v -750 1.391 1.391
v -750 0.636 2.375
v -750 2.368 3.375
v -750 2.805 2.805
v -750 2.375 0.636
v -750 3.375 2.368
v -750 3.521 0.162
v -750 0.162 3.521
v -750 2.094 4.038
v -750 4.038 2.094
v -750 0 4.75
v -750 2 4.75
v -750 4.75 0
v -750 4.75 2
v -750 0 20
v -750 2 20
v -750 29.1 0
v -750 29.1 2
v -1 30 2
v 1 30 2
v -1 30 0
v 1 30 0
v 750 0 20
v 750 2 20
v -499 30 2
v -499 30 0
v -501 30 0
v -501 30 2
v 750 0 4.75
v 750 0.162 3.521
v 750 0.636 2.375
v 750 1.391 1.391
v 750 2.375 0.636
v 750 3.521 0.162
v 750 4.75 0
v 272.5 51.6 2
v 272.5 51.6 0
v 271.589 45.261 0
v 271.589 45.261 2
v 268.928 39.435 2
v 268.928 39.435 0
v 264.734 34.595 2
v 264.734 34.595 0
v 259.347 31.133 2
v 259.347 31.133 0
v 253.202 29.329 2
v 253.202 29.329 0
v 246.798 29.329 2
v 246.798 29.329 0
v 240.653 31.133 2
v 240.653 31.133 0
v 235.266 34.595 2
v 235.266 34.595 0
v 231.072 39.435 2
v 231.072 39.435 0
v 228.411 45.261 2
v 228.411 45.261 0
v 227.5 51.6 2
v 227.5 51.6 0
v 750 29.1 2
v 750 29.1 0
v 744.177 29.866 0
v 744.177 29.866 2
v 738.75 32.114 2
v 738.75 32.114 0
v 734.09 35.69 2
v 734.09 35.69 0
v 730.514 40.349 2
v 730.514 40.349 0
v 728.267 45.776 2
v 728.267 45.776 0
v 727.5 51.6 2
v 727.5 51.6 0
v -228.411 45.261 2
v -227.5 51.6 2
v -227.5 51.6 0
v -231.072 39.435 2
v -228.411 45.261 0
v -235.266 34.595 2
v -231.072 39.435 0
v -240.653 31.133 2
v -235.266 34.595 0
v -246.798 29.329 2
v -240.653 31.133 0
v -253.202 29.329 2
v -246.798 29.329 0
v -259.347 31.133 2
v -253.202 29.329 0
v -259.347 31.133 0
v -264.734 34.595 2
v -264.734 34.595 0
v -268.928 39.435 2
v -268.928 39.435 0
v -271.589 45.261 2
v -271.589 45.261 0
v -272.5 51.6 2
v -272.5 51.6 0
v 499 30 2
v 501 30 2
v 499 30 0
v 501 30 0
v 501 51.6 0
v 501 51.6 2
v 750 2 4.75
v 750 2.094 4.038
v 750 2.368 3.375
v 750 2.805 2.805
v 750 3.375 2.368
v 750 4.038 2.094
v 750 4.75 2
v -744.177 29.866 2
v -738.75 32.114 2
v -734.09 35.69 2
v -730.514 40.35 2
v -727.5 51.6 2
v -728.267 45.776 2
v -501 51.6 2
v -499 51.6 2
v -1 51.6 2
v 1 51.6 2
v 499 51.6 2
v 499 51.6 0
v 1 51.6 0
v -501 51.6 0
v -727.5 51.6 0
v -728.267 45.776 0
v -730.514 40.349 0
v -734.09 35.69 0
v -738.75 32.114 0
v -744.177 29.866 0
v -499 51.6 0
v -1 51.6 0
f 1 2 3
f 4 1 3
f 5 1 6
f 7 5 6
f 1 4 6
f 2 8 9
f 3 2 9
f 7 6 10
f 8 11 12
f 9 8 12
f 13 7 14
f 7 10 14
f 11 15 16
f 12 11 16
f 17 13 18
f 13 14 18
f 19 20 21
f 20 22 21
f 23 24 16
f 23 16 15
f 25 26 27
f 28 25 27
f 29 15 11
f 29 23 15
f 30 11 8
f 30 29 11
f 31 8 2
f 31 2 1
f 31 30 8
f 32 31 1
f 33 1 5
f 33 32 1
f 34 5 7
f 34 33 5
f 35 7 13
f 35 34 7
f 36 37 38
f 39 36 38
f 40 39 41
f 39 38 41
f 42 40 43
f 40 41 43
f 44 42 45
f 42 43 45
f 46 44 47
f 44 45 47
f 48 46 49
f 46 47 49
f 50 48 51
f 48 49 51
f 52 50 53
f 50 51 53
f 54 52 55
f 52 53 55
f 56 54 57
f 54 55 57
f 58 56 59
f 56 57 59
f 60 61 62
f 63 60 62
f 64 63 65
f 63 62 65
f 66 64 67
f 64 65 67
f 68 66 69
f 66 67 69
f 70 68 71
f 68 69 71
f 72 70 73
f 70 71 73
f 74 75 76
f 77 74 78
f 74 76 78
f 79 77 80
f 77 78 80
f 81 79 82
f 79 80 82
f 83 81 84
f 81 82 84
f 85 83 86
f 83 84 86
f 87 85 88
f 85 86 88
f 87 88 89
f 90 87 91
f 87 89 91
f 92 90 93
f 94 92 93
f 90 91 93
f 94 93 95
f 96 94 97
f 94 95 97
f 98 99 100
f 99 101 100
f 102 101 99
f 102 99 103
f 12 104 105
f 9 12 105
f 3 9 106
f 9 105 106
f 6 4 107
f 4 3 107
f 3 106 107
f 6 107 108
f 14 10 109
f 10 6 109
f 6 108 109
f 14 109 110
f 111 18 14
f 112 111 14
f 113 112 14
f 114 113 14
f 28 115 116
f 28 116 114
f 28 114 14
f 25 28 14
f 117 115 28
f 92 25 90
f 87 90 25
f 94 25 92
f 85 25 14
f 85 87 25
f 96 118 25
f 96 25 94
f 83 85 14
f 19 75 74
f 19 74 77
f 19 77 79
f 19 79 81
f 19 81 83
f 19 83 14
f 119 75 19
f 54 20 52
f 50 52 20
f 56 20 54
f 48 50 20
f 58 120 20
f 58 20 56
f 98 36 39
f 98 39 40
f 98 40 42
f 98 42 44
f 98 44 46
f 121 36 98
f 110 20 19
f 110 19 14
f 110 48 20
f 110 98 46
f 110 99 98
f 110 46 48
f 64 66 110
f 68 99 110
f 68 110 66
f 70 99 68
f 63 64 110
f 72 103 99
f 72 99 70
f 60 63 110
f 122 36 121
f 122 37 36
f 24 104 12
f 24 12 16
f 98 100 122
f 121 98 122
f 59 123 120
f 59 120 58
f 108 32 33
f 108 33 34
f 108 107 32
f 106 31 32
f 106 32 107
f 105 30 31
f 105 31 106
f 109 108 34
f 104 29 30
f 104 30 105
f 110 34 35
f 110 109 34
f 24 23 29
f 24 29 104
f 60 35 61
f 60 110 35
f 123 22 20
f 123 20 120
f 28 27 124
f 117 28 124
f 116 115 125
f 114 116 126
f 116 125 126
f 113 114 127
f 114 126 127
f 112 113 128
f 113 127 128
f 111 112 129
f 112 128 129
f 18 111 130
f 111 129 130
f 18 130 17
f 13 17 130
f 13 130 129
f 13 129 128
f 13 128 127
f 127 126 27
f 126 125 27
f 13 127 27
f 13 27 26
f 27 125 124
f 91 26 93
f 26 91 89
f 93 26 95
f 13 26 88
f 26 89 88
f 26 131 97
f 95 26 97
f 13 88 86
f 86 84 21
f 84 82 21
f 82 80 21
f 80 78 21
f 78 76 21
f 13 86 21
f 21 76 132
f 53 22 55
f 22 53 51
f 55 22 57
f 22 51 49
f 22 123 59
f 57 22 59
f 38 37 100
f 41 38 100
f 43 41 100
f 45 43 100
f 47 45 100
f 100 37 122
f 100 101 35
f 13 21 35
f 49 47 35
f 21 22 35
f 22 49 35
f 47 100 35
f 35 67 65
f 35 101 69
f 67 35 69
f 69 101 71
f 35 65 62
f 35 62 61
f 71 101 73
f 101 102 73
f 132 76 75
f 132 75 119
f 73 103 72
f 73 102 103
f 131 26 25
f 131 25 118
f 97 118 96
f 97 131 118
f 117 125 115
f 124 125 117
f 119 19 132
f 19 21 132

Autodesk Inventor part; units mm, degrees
ref_plane "YZ Plane" through (0, 0, 0) normal (1, 0, 0) x (0, 1, 0)
ref_plane "XZ Plane" through (0, 0, 0) normal (0, 1, 0) x (-1, 0, 0)
ref_plane "XY Plane" through (0, 0, 0) normal (0, 0, 1) x (1, 0, 0)
sketch "Sketch1" plane through (0, 0, 0) normal (0, 0, 1) x (1, 0, 0)
  line L0 (-750, 51.5995) -> (750, 51.5995)
  line L1 (750, 51.5995) -> (750, 0)
  line L2 (750, 0) -> (-750, 0)
  line L3 (-750, 0) -> (-750, 51.5995)
  point P0 (0, 0)
  point P1 (0, 0)
  dimension "d0" = 1500
  dimension "d1" = 51.5994
extrude "Plate1" add sketch "Sketch1" along normal blind 2
sketch "Sketch2" plane through (750, 2, 0) normal (0, -1, 0) x (1, 0, 0)
  line L0 (-1500, 0) -> (0, 0)
  line L1 (0, 0) -> (0, 20)
  line L2 (0, 20) -> (-1500, 20)
  line L3 (-1500, 20) -> (-1500, 0)
edge flange "Flange1" height 20 angle 90 thickness 2 bend radius 2.75 thickness toward (0, -1, 0) relief round relief width 2 relief depth 1 edges at (0, 0, 2) wall of the first edge with corners at (-750, 2, 0) (750, 2, 0) (750, 2, 20) (-750, 2, 20)
bend "Bend1"
corner "Corner1"
sketch "Sketch5" plane through (0, 0, 0) normal (0, 0, -1) x (-1, 0, 0)
  line L0 (750, 51.5995) -> (-750, 51.5995) projected
  line L1 (-1, 30) -> (-1, 51.5995)
  line L2 (750, 0) -> (-750, 0) projected
  line L3 (-1, 30) -> (1, 30)
  line L4 (1, 30) -> (1, 51.5995)
  point P0 (0, 0)
  point P1 (0, 30)
  point P2 (0, 0)
  dimension "d27" = 2
  dimension "d28" = 30
extrude "Extrusion1" cut sketch "Sketch5" against normal through all
pattern_linear "Rectangular Pattern1" count 3 spacing 500 along (1, 0, 0) of "Extrusion1" first direction both ways yes
sketch "Sketch6" plane through (0, 0, 0) normal (0, 0, -1) x (-1, 0, 0)
  line L0 (-750, 51.5995) -> (-750, 4.75) projected
  circle A0 centre (-750, 51.5995) radius 22.5
  line L1 (-750, 51.5995) -> (750, 51.5995) projected
  line L2 (-1, 30) -> (-1, 51.5995) construction
  line L3 (-499, 51.5995) -> (-499, 30) construction
  line L4 (-499, 30) -> (-1, 30) construction
  circle A1 centre (-250, 51.5995) radius 22.5
  point P0 (0, 0)
  point P1 (-727.5, 51.5995)
  point P2 (-750, 29.0995)
  point P3 (-250, 30)
  point P4 (-227.5, 51.5995)
  point P5 (-272.5, 51.5995)
  dimension "d24" = 45
extrude "Extrusion2" cut sketch "Sketch6" against normal through all contours L1 A0 L0 | L1 A1 picked at (-748.3311, 36.7875) picked at (-245.5216, 43.6323)
mirror "Mirror1" about plane through (0, 0, 0) normal (1, 0, 0) of "Extrusion2"
sketch "Sketch7" plane through (0, 0, 2) normal (0, 0, 1) x (1, 0, 0)
  arc A0 (-750, 29.0995) -> (-727.5, 51.5995) centre (-750, 51.5995) ccw projected
  line L0 (-750, 4.75) -> (-750, 29.0995) projected
  line L1 (-750, 4.75) -> (750, 4.75) projected
  line L2 (750, 29.0995) -> (750, 4.75) projected
  arc A1 (727.5, 51.5995) -> (750, 29.0995) centre (750, 51.5995) ccw projected
  line L3 (501, 51.5995) -> (727.5, 51.5995) projected
  line L4 (501, 51.5995) -> (501, 30) projected
  line L5 (501, 30) -> (499, 30) projected
  line L6 (499, 30) -> (499, 51.5995) projected
  line L7 (1, 51.5995) -> (227.5, 51.5995) projected
  line L8 (1, 51.5995) -> (1, 30) projected
  line L9 (1, 30) -> (-1, 30) projected
  line L10 (-1, 30) -> (-1, 51.5995) projected
  line L11 (-499, 51.5995) -> (-272.5, 51.5995) projected
  line L12 (-499, 51.5995) -> (-499, 30) projected
  line L13 (-499, 30) -> (-501, 30) projected
  line L14 (-501, 30) -> (-501, 51.5995) projected
  line L15 (-727.5, 51.5995) -> (-501, 51.5995) projected
  line L16 (650, 4.75) -> (650, 51.5995) construction
  line L17 (-750, 4.75) -> (750, 4.75) projected
  line L18 (646, 24.7106) -> (650, 31.6388)
  line L19 (650, 31.6388) -> (654, 24.7106)
  line L20 (654, 24.7106) -> (646, 24.7106)
  line L21 (650, 31.6388) -> (650, 24.7106) construction
  line L22 (272.5, 51.5995) -> (499, 51.5995) projected
  arc A2 (227.5, 51.5995) -> (272.5, 51.5995) centre (250, 51.5995) ccw projected
  line L23 (-227.5, 51.5995) -> (-1, 51.5995) projected
  arc A3 (-272.5, 51.5995) -> (-227.5, 51.5995) centre (-250, 51.5995) ccw projected
  point P0 (0, 0)
  point P1 (650, 28.1747)
  dimension "d29" = 100
  dimension "d30" = 8
extrude "Extrusion3" [suppressed]
mirror "Mirror2" [suppressed]
sketch "Sketch8" plane through (0, 0, 2) normal (0, 0, 1) x (1, 0, 0)
  line L0 (494, 46.5995) -> (494, 34.5995) construction
  line L1 (494, 34.5995) -> (294, 34.5995) construction
  line L2 (294, 34.5995) -> (294, 46.5995) construction
  line L3 (294, 46.5995) -> (494, 46.5995) construction
  line L4 (501, 51.5995) -> (727.5, 51.5995) projected
  line L5 (272.5, 51.5995) -> (499, 51.5995) projected
  point P0 (0, 0)
  dimension "d35" = 200
  dimension "d36" = 12
  dimension "d39" = 5
  dimension "d40" = 5
mark "Mark1"
equation "\"d28\" = Стрингер_глубина_паза"
equation "\"d1\" = Стрингер_5"
equation "\"d27\" = d18"
equation "\"d2\" = Thickness"
equation "\"d3\" = BendReliefWidth"
equation "\"d4\" = BendReliefDepth"
equation "\"d5\" = MinimumRemnant"
equation "\"d6\" = TransitionRadius"
equation "\"d9\" = BendRadius"
equation "\"d10\" = CornerReliefSize"
equation "\"d11\" = GapSize"
equation "\"d12\" = JacobiRadiusSize"
equation "\"BendReliefWidth\" = Thickness"
equation "\"BendReliefDepth\" = 0.5 * Thickness"
equation "\"CornerReliefSize\" = 4 * Thickness"
equation "\"MinimumRemnant\" = 2 * Thickness"
equation "\"TransitionRadius\" = BendRadius"
equation "\"JacobiRadiusSize\" = BendRadius"
equation "\"GapSize\" = Thickness"
equation "\"d18\" = Thickness"
equation "\"Стрингер_5\" = 51.599453"
equation "\"Thickness\" = 2"
equation "\"BendRadius\" = 2.75"
equation "\"Стрингер_глубина_паза\" = 30"
properties part number "MSC 065 stringer board ###" material "Stainless Steel"
